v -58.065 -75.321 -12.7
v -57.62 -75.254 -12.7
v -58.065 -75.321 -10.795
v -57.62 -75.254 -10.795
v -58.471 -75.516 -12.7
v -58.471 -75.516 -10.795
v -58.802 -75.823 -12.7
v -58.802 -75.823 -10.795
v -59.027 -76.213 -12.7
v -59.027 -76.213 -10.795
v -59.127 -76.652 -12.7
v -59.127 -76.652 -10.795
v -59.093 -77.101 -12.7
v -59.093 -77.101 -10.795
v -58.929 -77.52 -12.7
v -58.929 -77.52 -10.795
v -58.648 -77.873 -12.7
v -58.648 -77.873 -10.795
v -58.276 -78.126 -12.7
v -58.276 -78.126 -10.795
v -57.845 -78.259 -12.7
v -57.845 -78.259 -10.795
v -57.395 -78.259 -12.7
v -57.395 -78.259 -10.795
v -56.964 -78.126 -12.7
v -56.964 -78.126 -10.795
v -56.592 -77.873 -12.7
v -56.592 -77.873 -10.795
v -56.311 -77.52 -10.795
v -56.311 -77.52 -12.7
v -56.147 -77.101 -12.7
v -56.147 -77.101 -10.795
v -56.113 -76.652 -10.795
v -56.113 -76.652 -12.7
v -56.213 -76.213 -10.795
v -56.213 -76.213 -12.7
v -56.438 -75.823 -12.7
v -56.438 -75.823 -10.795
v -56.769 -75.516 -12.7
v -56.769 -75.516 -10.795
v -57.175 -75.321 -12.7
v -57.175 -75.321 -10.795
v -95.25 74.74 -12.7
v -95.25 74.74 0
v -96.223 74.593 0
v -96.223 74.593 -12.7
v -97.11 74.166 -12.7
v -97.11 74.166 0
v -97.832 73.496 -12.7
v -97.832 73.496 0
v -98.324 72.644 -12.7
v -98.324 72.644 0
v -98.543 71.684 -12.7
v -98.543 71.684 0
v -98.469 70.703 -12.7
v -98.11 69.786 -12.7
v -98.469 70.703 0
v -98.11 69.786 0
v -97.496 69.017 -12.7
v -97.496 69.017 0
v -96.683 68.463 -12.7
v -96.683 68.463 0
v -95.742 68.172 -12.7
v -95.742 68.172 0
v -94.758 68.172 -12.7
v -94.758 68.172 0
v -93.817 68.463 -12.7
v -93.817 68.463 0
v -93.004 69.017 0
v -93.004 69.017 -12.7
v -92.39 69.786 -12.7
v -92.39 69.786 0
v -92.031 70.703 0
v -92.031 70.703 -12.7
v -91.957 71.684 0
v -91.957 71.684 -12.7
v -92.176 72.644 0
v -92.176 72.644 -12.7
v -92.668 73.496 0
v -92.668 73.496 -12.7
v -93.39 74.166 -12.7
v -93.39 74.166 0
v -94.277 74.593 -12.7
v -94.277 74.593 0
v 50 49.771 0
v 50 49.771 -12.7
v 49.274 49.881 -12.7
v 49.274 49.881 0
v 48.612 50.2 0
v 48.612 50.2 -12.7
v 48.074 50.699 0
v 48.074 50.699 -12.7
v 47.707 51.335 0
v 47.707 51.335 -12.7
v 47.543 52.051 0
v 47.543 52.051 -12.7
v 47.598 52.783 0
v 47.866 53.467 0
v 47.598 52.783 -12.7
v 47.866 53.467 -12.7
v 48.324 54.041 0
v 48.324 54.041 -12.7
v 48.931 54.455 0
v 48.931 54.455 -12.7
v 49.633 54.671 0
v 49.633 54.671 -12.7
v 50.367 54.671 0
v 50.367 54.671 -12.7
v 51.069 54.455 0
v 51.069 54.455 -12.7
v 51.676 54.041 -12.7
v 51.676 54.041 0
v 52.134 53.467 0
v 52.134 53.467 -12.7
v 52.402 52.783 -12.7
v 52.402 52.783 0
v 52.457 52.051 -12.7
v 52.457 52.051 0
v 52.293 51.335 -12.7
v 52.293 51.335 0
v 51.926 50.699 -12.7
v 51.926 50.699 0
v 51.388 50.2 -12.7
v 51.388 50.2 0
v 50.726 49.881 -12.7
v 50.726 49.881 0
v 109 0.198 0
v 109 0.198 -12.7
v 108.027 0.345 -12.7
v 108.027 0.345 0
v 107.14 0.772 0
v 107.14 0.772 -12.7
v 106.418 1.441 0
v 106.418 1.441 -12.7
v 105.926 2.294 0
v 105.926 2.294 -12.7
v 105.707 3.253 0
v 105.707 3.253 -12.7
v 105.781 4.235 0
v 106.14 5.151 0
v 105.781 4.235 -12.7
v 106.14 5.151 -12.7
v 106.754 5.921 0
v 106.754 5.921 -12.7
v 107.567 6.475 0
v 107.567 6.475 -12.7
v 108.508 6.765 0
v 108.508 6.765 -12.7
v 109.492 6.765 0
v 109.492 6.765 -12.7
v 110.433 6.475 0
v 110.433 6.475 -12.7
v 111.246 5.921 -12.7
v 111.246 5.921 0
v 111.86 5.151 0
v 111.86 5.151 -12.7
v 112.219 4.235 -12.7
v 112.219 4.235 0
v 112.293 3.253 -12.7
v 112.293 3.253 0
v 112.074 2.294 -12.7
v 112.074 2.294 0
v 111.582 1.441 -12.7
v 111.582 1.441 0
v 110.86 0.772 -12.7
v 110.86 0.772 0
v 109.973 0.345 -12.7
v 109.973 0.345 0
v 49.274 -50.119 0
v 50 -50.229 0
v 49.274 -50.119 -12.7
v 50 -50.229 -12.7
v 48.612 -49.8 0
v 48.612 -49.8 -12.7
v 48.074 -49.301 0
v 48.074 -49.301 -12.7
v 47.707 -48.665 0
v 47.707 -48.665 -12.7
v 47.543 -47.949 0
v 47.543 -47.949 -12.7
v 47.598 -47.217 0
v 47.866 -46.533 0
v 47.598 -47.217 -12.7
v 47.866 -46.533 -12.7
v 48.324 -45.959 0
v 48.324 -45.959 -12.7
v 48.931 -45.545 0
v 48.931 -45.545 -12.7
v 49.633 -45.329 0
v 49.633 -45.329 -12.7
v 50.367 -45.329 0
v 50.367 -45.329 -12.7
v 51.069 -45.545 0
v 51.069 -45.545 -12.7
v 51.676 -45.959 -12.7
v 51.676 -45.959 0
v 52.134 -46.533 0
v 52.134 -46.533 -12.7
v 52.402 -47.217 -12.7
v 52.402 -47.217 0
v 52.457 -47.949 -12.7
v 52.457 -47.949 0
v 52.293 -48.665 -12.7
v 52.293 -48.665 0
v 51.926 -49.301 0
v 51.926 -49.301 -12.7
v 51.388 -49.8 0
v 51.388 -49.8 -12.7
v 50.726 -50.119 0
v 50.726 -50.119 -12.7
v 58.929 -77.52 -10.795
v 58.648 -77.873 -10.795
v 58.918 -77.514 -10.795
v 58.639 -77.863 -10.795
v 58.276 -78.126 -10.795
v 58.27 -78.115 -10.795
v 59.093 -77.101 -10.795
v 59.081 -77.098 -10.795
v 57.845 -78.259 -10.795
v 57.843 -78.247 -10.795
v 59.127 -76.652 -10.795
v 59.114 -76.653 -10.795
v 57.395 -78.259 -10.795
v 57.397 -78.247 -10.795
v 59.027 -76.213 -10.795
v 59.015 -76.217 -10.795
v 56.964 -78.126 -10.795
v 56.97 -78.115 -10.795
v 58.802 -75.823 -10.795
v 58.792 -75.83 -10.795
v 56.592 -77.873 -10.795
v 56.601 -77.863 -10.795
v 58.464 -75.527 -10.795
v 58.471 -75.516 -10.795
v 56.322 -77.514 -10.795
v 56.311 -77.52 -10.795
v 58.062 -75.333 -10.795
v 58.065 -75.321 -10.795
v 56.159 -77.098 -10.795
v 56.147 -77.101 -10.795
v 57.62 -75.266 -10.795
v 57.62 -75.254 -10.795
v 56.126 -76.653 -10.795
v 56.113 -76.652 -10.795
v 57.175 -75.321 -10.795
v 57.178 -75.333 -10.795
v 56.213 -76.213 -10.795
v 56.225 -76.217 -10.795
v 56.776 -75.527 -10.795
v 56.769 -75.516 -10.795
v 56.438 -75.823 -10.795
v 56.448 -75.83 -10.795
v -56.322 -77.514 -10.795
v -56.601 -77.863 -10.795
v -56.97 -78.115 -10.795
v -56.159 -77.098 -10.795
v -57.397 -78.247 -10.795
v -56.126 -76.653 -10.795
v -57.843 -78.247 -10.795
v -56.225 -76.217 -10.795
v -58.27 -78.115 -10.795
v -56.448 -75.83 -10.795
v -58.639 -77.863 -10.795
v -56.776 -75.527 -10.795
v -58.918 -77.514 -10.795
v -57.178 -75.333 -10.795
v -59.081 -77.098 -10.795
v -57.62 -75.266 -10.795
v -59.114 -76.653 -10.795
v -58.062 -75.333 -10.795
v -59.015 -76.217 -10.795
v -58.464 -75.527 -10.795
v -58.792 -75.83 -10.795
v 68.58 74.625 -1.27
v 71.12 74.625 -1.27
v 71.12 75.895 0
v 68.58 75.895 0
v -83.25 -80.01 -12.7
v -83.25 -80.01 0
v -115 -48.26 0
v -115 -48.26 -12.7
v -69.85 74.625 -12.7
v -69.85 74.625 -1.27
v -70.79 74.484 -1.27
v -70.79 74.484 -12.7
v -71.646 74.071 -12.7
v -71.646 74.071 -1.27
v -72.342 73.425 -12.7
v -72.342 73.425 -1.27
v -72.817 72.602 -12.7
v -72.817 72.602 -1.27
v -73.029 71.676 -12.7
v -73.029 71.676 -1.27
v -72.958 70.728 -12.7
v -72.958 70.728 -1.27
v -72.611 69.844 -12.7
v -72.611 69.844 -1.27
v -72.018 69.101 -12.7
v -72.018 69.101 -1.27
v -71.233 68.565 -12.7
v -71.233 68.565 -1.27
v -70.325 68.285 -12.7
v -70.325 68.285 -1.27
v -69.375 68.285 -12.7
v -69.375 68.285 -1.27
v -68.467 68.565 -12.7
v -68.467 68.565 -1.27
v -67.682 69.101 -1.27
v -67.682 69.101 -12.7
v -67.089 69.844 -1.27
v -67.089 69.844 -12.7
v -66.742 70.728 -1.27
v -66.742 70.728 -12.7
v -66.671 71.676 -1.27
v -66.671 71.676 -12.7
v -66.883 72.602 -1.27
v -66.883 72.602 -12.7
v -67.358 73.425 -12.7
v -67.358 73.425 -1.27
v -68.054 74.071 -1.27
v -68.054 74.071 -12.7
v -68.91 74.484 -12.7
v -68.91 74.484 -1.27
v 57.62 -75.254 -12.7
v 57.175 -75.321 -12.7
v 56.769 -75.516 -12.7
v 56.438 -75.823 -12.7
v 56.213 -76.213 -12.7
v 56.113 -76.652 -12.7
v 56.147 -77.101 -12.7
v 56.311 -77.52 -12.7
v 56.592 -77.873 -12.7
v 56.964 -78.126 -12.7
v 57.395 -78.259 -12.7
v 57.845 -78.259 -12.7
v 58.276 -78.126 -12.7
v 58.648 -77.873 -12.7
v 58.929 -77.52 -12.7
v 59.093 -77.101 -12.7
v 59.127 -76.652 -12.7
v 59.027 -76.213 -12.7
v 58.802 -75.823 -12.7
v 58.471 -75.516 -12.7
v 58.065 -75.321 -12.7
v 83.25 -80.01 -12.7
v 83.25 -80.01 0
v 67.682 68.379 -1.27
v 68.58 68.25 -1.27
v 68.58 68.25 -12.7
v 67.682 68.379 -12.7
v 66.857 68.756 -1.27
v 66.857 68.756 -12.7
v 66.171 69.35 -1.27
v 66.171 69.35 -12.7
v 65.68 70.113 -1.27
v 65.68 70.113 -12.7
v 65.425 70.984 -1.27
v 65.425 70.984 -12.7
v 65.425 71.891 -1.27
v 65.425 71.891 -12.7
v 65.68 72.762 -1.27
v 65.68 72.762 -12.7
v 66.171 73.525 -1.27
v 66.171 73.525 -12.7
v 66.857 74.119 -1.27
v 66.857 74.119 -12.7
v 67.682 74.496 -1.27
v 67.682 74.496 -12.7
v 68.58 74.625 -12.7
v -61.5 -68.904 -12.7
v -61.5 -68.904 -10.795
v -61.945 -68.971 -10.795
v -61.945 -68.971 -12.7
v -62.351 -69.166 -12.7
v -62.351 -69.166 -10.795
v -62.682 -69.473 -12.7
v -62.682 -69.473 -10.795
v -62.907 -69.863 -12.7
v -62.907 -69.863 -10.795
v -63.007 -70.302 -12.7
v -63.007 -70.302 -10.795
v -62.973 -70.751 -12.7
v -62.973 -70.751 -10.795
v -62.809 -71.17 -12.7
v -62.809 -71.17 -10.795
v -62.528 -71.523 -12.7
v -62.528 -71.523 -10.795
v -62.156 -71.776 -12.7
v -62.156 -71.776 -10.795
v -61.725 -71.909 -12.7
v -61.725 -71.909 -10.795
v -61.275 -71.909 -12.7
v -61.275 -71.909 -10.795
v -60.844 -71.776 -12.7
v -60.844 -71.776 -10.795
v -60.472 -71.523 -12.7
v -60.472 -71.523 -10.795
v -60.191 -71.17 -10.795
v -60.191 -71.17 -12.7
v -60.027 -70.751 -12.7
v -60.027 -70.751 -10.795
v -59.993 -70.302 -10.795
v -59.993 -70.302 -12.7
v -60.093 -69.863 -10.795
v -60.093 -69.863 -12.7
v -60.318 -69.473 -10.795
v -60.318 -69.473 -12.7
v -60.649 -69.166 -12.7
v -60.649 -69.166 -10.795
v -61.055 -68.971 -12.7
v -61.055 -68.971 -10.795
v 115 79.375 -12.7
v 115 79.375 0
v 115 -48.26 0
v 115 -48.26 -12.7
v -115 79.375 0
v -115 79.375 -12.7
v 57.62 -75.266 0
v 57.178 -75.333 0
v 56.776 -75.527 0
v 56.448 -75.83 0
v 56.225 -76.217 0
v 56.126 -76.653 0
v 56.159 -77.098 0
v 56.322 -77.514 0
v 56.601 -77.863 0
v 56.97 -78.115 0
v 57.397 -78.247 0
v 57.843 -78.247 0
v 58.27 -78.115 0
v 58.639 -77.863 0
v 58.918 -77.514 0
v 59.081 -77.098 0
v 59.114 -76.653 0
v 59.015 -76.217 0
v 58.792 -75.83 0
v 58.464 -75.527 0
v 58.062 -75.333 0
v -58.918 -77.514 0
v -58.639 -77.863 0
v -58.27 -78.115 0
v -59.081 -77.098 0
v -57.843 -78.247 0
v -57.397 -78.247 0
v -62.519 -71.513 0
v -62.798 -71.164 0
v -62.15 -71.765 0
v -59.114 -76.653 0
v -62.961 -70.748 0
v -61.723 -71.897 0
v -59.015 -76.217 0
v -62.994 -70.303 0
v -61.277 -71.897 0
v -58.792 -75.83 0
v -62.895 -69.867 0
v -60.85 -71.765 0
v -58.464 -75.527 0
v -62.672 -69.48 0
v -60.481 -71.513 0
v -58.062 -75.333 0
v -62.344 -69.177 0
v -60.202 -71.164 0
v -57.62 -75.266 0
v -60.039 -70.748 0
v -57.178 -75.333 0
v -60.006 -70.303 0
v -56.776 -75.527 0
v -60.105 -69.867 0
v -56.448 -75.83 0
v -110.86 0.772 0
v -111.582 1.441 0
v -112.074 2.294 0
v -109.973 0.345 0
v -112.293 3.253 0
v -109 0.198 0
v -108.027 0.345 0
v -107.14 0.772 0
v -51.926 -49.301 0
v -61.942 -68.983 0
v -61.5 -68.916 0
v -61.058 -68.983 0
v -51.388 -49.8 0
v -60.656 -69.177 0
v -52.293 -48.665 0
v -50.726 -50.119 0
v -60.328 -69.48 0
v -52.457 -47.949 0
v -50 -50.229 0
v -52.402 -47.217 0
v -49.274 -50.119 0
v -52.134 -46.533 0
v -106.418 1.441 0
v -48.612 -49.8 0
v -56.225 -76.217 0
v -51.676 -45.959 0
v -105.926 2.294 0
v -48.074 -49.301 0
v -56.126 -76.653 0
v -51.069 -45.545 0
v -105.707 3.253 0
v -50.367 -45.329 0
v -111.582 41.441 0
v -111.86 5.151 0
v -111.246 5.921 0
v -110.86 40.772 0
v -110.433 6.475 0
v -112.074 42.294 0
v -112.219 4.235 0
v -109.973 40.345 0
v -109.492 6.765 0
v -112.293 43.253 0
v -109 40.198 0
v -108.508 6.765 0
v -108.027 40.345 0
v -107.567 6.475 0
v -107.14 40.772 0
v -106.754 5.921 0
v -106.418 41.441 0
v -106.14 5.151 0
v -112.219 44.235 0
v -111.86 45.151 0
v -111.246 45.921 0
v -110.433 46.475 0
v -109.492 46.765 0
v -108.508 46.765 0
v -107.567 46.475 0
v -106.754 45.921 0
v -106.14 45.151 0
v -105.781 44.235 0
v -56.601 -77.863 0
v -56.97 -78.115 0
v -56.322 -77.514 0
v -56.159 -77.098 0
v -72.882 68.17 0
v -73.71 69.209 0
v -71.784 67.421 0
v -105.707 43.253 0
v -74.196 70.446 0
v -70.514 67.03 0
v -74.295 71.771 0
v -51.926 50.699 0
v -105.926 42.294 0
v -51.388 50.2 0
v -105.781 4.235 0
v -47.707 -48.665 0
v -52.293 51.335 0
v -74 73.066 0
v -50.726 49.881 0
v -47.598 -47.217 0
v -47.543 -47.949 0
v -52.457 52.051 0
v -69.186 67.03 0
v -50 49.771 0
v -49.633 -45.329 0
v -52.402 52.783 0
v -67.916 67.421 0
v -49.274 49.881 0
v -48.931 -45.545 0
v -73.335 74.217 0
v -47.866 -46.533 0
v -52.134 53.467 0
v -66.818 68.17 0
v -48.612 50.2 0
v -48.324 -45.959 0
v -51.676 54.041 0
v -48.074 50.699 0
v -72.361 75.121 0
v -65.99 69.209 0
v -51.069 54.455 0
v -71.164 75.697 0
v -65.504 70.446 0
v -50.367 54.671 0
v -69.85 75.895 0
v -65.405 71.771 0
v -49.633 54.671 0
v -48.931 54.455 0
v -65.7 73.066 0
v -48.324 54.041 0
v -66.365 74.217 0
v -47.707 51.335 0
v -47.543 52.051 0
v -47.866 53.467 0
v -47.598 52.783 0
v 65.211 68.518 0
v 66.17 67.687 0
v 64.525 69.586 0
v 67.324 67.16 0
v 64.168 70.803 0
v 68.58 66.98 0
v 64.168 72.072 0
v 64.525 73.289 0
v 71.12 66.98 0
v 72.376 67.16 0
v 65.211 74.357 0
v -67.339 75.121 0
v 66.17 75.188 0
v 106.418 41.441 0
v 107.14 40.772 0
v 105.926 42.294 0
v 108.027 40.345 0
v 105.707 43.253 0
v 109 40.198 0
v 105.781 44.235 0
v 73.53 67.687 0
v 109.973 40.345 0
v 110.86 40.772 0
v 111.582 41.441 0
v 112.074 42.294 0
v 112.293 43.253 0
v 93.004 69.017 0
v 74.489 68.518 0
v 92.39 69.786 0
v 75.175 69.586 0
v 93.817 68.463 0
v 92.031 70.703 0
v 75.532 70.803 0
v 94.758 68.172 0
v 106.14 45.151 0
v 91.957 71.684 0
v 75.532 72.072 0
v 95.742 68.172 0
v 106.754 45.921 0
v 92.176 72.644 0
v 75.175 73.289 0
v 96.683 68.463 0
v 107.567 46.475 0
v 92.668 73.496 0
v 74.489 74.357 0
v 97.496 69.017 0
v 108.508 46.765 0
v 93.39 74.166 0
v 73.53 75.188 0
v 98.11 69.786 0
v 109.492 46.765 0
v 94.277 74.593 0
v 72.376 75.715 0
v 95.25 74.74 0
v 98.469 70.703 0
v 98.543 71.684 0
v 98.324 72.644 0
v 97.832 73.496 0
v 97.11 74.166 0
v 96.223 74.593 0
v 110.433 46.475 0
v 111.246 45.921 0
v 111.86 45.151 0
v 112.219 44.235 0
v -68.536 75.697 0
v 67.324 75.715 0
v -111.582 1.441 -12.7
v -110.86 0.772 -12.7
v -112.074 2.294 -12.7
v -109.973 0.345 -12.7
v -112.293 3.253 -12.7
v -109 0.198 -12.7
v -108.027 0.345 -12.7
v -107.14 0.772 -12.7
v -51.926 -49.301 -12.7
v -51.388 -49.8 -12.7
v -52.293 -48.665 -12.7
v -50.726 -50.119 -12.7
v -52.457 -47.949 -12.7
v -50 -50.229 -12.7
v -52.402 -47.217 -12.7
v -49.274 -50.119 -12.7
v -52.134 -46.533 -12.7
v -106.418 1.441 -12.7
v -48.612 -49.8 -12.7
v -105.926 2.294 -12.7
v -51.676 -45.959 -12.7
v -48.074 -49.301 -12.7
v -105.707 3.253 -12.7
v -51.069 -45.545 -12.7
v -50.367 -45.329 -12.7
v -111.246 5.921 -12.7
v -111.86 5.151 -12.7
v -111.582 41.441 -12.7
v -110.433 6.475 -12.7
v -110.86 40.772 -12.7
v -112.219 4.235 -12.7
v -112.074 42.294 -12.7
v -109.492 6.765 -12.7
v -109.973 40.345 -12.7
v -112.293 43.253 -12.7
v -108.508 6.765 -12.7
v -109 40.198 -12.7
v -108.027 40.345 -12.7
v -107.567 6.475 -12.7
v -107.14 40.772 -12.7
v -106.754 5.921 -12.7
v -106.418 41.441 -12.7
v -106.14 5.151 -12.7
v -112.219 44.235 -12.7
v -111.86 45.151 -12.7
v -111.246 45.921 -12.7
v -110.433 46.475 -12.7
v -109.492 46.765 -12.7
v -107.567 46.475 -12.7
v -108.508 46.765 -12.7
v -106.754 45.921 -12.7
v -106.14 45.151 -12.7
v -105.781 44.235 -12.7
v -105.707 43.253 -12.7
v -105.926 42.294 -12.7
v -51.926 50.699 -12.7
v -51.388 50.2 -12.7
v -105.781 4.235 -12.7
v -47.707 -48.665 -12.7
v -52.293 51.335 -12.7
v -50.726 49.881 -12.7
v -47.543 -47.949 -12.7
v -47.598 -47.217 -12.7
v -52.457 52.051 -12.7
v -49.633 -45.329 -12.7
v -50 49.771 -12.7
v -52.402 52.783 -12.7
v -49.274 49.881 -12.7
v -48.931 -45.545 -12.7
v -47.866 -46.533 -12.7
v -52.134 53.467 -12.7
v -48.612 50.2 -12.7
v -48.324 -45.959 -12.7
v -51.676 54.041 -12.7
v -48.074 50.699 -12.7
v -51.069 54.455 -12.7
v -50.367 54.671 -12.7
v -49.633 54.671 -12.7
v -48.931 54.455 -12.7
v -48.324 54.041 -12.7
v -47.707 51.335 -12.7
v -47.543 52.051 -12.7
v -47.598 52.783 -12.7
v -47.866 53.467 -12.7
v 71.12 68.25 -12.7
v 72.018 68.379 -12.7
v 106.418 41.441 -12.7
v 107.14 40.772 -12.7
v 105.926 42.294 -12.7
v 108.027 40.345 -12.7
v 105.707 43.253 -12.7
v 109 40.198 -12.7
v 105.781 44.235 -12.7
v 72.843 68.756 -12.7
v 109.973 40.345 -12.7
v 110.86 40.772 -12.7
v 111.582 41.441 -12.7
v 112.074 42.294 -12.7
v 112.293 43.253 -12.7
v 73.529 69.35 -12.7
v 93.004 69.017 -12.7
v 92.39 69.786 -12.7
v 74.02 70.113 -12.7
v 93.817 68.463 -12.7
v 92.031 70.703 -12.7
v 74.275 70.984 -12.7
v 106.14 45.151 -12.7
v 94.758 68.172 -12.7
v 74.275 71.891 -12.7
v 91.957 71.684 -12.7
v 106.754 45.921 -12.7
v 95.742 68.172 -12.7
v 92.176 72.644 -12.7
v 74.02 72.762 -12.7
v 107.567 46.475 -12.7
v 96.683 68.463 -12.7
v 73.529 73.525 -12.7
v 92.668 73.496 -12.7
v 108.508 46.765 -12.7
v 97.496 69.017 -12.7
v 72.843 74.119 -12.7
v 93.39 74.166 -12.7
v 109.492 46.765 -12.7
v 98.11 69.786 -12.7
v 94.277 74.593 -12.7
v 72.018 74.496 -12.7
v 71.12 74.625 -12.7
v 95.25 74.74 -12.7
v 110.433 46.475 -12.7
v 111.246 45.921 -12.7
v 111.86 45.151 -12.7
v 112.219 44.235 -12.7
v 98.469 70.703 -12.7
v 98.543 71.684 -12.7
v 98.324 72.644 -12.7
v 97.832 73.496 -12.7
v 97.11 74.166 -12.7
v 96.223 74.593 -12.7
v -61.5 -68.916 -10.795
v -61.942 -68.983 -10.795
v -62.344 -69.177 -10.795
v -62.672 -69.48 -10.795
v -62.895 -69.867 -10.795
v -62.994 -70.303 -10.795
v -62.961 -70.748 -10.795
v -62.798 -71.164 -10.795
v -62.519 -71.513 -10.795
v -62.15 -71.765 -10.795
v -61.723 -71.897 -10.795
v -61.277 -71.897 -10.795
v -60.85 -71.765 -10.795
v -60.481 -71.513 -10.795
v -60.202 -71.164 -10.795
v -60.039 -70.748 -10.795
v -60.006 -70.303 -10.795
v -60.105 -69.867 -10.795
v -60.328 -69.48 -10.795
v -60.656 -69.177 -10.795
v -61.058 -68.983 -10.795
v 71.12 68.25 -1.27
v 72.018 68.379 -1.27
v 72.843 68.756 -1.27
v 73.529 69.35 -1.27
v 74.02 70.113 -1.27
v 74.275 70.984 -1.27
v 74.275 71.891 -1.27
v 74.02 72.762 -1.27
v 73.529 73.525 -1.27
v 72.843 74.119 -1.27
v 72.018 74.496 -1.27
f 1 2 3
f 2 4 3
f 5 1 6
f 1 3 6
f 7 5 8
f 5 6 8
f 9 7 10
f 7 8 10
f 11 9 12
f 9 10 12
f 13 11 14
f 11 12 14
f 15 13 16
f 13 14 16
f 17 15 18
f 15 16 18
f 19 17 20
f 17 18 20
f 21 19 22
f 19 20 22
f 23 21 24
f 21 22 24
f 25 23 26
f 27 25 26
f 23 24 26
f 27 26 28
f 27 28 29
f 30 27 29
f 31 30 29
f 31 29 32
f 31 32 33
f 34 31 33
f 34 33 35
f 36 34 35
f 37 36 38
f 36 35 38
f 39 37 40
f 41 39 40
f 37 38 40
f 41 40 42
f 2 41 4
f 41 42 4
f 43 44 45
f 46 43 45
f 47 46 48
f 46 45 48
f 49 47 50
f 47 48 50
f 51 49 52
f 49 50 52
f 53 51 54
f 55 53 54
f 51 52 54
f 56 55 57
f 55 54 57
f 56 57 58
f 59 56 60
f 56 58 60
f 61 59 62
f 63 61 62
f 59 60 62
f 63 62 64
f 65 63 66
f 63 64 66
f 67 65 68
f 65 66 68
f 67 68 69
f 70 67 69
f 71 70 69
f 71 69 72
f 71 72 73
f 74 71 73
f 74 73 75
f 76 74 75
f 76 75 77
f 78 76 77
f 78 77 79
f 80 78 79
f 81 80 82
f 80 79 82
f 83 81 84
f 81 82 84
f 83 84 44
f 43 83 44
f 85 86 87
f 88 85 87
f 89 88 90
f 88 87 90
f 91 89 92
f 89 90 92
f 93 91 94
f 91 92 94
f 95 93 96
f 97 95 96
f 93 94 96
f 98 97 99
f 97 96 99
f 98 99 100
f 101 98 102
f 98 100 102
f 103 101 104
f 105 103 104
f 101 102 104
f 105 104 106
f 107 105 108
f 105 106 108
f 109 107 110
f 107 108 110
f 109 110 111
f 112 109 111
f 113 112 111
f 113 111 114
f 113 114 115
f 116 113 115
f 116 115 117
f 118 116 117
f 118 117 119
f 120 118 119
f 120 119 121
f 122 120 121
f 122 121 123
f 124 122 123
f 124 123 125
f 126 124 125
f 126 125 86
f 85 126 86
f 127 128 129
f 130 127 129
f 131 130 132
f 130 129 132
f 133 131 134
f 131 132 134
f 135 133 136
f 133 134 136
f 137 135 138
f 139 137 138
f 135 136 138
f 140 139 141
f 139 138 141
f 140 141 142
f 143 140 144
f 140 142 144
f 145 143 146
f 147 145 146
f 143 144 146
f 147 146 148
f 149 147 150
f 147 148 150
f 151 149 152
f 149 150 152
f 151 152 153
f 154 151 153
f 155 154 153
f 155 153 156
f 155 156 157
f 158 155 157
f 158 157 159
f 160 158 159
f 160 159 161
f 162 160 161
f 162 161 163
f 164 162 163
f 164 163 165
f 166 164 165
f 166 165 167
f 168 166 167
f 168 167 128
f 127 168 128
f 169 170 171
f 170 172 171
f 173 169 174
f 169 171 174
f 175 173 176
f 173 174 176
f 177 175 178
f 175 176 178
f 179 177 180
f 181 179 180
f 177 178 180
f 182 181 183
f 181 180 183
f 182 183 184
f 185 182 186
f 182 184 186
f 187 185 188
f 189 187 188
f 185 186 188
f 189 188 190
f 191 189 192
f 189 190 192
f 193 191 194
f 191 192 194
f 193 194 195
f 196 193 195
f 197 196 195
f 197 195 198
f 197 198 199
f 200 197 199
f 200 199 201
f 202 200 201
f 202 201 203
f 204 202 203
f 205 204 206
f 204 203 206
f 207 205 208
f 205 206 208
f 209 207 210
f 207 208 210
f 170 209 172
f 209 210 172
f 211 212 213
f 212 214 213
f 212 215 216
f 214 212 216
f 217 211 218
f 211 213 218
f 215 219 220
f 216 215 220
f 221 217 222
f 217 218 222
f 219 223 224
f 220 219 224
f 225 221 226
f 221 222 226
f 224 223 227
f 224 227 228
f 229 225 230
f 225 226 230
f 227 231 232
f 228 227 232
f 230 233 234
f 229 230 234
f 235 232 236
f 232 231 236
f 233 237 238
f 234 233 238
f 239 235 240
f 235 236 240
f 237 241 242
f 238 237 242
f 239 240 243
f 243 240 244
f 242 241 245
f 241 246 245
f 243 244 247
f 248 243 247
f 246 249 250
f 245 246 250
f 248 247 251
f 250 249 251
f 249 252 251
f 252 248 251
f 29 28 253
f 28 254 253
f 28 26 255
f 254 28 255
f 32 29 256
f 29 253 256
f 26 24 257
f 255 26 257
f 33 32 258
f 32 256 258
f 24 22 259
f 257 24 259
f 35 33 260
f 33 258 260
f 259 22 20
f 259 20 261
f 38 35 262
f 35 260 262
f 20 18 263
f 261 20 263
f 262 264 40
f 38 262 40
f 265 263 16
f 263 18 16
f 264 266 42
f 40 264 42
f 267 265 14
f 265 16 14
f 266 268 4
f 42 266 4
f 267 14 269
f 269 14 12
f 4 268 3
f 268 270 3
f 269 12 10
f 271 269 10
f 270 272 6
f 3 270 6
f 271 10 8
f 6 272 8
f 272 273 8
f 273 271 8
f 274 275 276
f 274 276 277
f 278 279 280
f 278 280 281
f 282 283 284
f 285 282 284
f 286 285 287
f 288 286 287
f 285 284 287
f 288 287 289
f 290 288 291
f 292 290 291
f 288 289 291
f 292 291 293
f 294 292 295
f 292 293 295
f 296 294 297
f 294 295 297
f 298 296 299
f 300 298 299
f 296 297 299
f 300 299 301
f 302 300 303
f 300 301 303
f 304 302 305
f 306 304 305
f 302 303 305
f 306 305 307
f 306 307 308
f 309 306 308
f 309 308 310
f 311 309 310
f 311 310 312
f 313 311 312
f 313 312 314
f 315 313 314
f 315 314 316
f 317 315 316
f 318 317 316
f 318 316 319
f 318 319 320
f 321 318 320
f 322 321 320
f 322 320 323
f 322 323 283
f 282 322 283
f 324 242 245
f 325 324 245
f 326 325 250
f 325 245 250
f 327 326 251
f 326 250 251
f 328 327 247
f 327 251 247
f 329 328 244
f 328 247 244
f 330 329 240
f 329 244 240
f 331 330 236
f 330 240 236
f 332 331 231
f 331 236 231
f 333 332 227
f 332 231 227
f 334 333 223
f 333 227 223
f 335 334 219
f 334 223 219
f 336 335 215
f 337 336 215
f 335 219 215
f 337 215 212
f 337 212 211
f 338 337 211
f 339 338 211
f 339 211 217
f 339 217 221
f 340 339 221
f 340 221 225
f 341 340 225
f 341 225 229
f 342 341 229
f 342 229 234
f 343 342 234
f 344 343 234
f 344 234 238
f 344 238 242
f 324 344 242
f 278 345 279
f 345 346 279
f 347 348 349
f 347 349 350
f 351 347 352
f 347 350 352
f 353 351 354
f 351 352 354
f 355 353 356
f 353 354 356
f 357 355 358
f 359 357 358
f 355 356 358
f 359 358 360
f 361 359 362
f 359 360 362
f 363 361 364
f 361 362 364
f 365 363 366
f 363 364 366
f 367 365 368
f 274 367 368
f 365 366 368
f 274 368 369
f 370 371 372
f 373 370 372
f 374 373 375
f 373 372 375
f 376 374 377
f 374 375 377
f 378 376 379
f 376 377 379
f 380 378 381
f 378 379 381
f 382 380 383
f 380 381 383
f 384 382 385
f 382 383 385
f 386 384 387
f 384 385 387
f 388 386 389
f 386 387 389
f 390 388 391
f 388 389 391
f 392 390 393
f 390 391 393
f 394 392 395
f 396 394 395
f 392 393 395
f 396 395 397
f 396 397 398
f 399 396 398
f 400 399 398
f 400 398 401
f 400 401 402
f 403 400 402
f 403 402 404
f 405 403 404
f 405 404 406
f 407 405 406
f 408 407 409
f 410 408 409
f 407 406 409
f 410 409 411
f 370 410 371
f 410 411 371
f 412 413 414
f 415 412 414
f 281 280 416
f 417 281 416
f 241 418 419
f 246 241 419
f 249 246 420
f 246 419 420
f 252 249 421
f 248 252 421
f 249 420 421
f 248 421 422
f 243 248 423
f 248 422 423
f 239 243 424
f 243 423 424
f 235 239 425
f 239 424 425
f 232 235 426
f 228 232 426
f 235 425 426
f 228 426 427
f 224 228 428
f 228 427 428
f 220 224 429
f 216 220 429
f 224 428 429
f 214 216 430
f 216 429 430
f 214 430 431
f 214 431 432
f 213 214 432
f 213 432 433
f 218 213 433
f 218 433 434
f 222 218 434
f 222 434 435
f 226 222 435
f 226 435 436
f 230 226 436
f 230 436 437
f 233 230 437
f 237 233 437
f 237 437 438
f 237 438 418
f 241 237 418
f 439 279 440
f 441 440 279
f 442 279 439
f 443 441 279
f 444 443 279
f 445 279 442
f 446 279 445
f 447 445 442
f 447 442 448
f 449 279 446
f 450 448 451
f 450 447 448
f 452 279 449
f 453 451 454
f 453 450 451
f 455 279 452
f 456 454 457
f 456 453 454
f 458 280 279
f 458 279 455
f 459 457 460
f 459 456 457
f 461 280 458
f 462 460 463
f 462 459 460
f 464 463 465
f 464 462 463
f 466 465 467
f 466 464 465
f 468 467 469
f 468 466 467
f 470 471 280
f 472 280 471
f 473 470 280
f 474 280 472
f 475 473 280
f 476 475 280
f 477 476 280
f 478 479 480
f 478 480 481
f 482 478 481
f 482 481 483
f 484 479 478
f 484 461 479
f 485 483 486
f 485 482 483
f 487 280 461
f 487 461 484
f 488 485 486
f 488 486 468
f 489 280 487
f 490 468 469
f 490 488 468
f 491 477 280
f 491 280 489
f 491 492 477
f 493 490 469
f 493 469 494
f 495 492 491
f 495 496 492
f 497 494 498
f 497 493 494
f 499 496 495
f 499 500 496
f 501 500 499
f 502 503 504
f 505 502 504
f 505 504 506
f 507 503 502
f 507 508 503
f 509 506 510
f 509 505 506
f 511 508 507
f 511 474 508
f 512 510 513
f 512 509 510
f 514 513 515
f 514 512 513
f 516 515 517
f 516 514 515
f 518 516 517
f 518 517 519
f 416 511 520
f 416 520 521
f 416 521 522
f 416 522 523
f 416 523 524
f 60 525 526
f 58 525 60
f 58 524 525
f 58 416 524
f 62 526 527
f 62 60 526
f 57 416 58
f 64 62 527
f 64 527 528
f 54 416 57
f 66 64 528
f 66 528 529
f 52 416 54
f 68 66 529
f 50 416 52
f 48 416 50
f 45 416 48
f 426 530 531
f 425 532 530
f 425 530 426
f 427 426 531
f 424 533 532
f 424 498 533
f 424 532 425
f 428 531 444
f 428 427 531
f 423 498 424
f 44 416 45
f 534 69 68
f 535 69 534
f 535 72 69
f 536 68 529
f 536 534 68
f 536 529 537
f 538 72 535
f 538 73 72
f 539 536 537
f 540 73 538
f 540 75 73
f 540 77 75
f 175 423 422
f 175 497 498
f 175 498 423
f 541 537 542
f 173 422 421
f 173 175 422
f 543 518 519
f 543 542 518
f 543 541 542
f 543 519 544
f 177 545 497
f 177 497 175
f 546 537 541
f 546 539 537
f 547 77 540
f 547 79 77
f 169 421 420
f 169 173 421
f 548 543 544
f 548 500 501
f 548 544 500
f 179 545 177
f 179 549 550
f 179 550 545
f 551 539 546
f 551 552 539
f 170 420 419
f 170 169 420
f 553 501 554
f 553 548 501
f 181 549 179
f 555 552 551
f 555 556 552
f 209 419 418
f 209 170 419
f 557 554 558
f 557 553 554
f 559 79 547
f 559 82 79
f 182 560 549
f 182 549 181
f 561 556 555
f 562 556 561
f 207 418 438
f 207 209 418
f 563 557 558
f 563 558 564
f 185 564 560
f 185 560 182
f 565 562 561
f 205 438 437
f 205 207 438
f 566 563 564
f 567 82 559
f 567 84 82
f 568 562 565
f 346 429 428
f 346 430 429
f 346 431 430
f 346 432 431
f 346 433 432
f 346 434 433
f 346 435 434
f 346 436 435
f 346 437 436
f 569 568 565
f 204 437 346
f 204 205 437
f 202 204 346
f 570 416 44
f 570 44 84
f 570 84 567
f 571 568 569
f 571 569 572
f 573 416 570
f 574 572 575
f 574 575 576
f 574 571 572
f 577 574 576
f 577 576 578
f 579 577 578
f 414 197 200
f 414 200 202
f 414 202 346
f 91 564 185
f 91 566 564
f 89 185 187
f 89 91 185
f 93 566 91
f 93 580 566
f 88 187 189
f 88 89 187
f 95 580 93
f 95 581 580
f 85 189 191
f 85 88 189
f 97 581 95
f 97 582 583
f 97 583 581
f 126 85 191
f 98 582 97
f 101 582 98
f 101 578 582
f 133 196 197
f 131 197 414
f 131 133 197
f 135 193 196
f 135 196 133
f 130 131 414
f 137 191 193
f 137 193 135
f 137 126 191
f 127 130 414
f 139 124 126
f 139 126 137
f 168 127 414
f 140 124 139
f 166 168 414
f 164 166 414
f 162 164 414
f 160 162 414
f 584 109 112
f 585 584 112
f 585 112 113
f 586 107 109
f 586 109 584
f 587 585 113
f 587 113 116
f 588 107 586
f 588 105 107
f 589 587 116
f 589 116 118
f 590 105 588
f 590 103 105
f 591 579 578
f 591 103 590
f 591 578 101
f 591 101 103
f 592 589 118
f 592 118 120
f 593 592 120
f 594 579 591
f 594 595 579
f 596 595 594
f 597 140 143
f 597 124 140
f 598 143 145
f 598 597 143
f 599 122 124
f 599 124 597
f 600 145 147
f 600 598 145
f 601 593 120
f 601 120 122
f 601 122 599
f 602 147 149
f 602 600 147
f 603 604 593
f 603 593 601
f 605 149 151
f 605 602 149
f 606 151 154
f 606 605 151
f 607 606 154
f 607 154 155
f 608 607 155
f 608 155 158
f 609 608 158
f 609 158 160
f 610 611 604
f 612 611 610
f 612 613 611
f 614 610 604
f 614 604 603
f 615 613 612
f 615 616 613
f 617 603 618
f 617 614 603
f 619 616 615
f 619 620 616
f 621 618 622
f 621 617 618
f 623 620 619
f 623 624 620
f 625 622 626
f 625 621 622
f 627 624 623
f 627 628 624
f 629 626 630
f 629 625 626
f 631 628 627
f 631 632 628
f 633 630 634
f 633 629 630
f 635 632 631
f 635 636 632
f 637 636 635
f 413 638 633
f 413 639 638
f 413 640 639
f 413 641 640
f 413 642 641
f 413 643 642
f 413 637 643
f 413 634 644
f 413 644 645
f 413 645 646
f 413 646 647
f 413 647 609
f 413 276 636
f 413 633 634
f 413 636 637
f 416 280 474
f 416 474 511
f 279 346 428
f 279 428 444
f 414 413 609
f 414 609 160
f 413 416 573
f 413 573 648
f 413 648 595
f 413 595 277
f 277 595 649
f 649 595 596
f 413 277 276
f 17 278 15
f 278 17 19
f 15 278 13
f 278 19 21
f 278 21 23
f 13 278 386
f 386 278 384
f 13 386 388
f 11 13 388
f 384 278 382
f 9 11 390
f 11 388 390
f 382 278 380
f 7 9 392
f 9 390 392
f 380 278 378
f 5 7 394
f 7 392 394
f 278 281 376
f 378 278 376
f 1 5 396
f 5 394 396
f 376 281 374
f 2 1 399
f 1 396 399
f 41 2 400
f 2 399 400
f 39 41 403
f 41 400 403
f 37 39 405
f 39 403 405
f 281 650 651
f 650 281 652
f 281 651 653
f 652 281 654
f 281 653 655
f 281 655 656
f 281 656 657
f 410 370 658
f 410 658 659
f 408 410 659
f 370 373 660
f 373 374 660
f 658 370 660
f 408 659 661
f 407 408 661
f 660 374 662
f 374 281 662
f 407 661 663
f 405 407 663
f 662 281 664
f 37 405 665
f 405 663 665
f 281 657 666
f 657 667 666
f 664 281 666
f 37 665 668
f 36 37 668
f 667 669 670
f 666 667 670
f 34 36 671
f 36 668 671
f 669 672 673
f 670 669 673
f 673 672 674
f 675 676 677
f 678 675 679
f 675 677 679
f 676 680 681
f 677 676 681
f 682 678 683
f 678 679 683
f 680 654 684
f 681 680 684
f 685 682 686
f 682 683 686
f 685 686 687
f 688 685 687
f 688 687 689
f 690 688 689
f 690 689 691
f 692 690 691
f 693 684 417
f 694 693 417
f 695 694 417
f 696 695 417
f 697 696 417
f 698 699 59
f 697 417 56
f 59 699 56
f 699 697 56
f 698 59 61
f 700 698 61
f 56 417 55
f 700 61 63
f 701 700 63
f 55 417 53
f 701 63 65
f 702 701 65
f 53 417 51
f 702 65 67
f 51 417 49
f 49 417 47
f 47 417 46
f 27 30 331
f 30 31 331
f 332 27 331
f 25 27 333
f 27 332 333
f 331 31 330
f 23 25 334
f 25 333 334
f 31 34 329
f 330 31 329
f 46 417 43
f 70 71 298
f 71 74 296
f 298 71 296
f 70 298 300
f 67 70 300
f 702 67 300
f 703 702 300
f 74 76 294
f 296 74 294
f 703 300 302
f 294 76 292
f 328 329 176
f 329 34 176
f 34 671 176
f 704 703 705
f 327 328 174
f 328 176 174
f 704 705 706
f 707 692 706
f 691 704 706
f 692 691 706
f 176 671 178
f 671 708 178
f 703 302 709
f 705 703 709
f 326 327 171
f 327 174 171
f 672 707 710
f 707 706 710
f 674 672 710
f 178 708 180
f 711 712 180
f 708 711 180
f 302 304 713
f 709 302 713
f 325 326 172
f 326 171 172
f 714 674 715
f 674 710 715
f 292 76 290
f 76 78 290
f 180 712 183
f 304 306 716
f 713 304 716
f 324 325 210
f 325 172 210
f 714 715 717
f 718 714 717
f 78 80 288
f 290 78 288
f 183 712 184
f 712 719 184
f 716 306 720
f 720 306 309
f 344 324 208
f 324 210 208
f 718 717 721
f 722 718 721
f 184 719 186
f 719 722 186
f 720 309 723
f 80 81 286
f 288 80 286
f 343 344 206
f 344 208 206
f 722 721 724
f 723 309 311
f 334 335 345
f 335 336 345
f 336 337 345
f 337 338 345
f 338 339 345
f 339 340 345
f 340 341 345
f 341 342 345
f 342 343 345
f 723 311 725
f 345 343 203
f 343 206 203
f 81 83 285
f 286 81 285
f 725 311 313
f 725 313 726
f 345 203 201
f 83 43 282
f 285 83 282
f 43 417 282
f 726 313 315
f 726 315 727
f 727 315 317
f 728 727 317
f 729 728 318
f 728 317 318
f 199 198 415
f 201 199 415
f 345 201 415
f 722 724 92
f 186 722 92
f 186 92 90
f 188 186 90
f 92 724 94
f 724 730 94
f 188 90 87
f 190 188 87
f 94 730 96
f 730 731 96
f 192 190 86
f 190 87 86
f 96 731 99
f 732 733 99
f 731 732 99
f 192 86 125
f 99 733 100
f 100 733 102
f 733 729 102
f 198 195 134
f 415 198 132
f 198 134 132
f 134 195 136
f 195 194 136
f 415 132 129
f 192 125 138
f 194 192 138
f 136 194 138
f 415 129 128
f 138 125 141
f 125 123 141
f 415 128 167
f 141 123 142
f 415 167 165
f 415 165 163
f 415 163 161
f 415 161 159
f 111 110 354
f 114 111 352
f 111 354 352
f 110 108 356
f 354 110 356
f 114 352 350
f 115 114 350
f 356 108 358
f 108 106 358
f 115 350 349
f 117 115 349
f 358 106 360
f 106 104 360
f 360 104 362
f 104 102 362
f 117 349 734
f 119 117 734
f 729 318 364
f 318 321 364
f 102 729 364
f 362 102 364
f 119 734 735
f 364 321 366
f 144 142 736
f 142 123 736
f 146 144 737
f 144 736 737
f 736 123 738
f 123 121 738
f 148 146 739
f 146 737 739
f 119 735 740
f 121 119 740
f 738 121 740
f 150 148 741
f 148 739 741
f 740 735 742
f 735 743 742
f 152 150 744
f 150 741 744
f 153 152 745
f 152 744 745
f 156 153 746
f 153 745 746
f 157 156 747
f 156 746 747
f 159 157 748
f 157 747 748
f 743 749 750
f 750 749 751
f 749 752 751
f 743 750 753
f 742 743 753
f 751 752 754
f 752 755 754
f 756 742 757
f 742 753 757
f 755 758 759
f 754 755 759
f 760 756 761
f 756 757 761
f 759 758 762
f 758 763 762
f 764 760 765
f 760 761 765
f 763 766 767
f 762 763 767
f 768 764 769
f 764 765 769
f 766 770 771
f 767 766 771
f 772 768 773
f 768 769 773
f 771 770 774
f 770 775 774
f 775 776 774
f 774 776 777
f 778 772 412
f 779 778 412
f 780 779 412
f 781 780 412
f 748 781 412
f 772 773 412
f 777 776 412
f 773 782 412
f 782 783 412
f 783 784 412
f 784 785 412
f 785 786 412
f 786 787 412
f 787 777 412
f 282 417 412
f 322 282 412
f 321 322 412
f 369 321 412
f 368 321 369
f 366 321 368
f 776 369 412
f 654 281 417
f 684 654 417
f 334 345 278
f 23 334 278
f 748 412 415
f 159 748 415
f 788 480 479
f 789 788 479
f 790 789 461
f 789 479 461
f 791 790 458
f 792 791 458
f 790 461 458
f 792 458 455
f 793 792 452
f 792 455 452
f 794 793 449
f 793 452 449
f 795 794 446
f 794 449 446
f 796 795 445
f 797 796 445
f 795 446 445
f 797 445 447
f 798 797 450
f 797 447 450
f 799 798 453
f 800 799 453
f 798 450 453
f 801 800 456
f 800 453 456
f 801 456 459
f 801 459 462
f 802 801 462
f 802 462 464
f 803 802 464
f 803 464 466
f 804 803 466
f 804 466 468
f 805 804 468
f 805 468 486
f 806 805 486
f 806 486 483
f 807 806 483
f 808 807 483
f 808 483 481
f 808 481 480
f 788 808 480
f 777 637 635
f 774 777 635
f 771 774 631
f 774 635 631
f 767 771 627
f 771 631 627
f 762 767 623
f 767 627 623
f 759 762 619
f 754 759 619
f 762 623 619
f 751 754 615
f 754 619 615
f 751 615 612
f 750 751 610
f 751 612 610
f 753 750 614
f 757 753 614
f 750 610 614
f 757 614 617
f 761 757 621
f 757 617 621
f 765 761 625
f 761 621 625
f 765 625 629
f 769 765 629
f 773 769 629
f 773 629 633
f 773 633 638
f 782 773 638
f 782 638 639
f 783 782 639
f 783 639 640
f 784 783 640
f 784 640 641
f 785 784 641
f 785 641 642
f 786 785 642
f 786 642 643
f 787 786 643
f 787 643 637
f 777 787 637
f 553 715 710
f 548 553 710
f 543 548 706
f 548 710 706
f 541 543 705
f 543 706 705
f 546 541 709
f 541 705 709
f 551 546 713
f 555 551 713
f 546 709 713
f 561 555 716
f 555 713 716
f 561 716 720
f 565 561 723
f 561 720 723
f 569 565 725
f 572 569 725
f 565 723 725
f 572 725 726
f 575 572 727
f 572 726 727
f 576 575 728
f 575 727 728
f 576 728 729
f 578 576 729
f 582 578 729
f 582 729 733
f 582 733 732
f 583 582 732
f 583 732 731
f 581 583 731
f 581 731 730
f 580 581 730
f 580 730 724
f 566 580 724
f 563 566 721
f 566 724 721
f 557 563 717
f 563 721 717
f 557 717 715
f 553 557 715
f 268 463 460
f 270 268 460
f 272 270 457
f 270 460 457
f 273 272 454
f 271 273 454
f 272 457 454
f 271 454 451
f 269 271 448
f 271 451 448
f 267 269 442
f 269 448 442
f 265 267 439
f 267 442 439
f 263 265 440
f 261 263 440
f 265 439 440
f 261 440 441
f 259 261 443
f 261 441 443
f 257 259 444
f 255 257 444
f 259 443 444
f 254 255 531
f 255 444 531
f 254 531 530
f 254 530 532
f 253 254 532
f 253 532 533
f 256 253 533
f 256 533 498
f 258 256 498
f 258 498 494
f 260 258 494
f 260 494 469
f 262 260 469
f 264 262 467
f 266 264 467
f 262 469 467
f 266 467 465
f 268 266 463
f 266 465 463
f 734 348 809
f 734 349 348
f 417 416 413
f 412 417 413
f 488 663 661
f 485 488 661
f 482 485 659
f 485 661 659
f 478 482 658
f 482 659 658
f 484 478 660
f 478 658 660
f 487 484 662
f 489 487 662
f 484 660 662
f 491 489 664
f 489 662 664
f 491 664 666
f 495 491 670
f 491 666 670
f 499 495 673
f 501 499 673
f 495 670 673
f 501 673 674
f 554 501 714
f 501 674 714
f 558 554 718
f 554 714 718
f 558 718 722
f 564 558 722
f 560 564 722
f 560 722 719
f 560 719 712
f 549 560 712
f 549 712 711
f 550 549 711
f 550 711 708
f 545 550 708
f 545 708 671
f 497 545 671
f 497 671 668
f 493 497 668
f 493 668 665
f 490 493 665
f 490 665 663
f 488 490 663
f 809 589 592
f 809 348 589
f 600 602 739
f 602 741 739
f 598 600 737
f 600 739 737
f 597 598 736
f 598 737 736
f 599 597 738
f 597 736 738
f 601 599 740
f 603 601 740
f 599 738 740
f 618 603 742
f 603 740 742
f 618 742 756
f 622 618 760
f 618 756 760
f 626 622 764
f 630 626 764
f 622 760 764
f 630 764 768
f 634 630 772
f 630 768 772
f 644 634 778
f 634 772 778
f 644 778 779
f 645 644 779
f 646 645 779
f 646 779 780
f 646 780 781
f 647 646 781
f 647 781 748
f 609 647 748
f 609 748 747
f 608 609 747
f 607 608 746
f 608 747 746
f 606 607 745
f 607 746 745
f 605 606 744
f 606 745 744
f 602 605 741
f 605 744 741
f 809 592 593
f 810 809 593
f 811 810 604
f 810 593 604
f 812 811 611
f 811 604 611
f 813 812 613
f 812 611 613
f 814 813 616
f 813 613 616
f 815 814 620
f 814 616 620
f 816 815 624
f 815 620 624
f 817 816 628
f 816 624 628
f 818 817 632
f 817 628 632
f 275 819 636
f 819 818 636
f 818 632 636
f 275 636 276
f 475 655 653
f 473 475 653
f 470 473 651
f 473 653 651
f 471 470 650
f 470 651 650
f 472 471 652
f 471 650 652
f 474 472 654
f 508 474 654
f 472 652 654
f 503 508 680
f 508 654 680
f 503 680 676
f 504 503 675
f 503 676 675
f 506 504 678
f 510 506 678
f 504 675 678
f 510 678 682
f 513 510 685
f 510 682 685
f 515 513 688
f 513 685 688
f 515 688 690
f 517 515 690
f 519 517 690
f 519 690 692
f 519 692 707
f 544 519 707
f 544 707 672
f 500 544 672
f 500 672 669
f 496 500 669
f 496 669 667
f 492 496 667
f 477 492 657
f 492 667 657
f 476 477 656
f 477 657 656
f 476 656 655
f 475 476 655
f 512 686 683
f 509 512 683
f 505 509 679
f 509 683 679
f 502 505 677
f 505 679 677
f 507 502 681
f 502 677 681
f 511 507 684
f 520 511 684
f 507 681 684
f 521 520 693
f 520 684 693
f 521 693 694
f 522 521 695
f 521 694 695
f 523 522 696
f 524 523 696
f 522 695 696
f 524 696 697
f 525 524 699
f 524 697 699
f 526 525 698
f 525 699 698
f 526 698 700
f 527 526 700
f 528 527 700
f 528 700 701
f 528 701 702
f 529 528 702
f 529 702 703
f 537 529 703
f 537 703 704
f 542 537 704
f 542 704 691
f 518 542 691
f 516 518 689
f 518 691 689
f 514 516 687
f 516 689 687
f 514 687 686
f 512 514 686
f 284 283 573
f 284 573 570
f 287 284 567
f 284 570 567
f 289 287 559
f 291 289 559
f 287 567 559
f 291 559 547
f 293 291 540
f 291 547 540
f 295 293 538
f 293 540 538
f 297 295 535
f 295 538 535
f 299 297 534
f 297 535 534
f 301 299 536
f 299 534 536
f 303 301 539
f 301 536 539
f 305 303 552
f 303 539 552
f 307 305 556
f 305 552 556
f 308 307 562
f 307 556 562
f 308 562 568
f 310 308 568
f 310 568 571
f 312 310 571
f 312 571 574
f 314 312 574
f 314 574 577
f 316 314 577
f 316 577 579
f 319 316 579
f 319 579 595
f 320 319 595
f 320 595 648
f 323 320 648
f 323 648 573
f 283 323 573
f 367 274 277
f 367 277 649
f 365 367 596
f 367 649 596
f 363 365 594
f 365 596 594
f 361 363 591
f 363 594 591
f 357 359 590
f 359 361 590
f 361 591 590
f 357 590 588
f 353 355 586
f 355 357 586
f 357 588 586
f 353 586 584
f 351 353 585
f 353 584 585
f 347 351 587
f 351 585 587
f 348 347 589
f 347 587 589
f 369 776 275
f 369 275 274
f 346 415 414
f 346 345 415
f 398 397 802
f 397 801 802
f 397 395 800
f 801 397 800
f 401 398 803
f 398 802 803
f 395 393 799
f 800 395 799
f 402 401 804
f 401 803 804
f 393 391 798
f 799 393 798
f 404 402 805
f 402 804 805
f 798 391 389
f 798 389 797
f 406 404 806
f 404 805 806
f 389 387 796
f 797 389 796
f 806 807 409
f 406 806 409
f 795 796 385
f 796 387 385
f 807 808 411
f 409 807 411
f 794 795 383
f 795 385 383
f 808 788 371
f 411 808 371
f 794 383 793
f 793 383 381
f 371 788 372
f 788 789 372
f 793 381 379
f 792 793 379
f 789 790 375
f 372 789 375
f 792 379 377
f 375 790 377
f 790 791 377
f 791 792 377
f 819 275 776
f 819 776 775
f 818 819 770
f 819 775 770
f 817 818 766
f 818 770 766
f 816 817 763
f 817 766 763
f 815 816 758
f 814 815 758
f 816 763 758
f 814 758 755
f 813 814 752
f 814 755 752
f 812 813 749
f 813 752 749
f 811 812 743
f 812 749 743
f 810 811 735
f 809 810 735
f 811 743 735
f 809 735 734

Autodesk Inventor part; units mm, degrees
ref_plane "YZ Plane" through (0, 0, 0) normal (1, 0, 0) x (0, 1, 0)
ref_plane "XZ Plane" through (0, 0, 0) normal (0, 1, 0) x (-1, 0, 0)
ref_plane "XY Plane" through (0, 0, 0) normal (0, 0, 1) x (1, 0, 0)
sketch "Sketch1" plane through (0, 0, 0) normal (0, 0, 1) x (1, 0, 0)
  line L0 (0, 111.252) -> (0, -111.887) projected
  line L1 (-161, 0) -> (161, 0) projected
  line L2 (115, -80.01) -> (-115, -80.01)
  line L3 (-115, -80.01) -> (-115, 79.375)
  line L4 (-115, 79.375) -> (115, 79.375)
  line L5 (115, 79.375) -> (115, -80.01)
  line L6 (50, -47.7648) -> (-50, -47.7648) construction
  line L7 (-50, -47.7648) -> (-50, 52.2352) construction
  line L8 (-50, 52.2352) -> (50, 52.2352) construction
  line L9 (50, 52.2352) -> (50, -47.7648) construction
  line L10 (50, -47.7648) -> (-50, 52.2352) construction
  line L11 (-50, -47.7648) -> (50, 52.2352) construction
  line L12 (109, 3.5) -> (-109, 3.5) construction
  line L13 (-109, 3.5) -> (-109, 43.5) construction
  line L14 (-109, 43.5) -> (109, 43.5) construction
  line L15 (109, 43.5) -> (109, 3.5) construction
  line L16 (109, 3.5) -> (-109, 43.5) construction
  line L17 (-109, 3.5) -> (109, 43.5) construction
  point P0 (0, 2.2352)
  point P1 (0, 23.5)
  point P2 (-57.62, -76.7648)
  point P3 (57.62, -76.7648)
  dimension "d0" = 230
  dimension "d1" = 159.385
  dimension "d4" = 100
  dimension "d5" = 100
  dimension "d28" = 35.875
  dimension "d29" = 40
  dimension "d30" = 6
  dimension "d38" = 29
  dimension "d39" = 79.375
  dimension "d40" = 115
  dimension "d48" = 2.2352
  dimension "d52" = 7.62
  dimension "d53" = 7.62
extrude "Extrusion1" add sketch "Sketch1" against normal blind 12.7
hole "Hole1" at (-50, 52.2352, 0) at (50, 52.2352, 0) at (50, -47.7648, 0) at (-50, -47.7648, 0) direction (0, 0, -1) diameter 4.9276 end through all
hole "Hole3" at (-109, 43.5, 0) at (-109, 3.5, 0) at (109, 3.5, 0) at (109, 43.5, 0) direction (0, 0, -1) diameter 6.604 end through all clearance for "Socket Head Cap Screw" size "M6" standard "Ansi Metric M Profile"
chamfer "Chamfer1" distance 31.75 angle 45 2 edges at (-115, -80.01, -6.35) (115, -80.01, -6.35)
sketch "Sketch3" plane through (0, 0, -12.7) normal (0, 0, 1) x (1, 0, 0)
  line L0 (-95.25, 71.4375) -> (95.25, 71.4375) construction
  line L1 (0, 111.252) -> (0, -111.887) construction
  line L2 (-161, 0) -> (161, 0) construction
  line L3 (71.12, 71.4375) -> (68.58, 71.4375) construction
  line L4 (71.12, 74.6252) -> (68.58, 74.6252)
  line L5 (68.58, 68.2498) -> (71.12, 68.2498)
  arc A0 (71.12, 68.2498) -> (71.12, 74.6252) centre (71.12, 71.4375) ccw
  arc A1 (68.58, 74.6252) -> (68.58, 68.2498) centre (68.58, 71.4375) ccw
  line L6 (-115, 79.375) -> (115, 79.375) projected
  point P0 (0, 0)
  point P1 (-69.85, 71.4375)
  point P2 (69.85, 71.4375)
  dimension "d54" = 95.25
  dimension "d55" = 69.85
  dimension "d56" = 69.85
  dimension "d57" = 95.25
  dimension "d58" = 2.54
  dimension "d59" = 6.3754
  dimension "d69" = 7.9375
extrude "Extrusion3" cut sketch "Sketch3" along normal up to next
hole "Hole7" at (-69.85, 71.4375, -12.7) direction (0, 0, 1) diameter 6.3754 end through all
hole "Hole8" at (95.25, 71.4375, -12.7) at (-95.25, 71.4375, -12.7) direction (0, 0, 1) diameter 6.604 end through all clearance for "Socket Head Cap Screw" size "M6" standard "Ansi Metric M Profile"
chamfer "Chamfer3" distance 1.27 angle 45 5 edges at (-69.85, 68.2498, 0) (65.3923, 71.4375, 0) (69.85, 74.6252, 0) (74.3077, 71.4375, 0) (69.85, 68.2498, 0)
sketch "Sketch4" plane through (0, 0, -12.7) normal (0, 0, -1) x (-1, 0, 0)
  line L0 (0, -111.887) -> (0, 111.252) projected
  line L1 (-161, 0) -> (161, 0) projected
  line L2 (60, -77.854) -> (-60, -77.854) construction
  line L3 (-60, -77.854) -> (-60, 77.854) construction
  line L4 (-60, 77.854) -> (60, 77.854) construction
  line L5 (60, 77.854) -> (60, -77.854) construction
  line L6 (60, -77.854) -> (-60, 77.854) construction
  line L7 (-60, -77.854) -> (60, 77.854) construction
  circle A0 centre (61.5, -70.4148) radius 1.5 construction
  point P0 (0, 0)
  point P1 (-57.62, -76.7648)
  point P2 (57.62, -76.7648)
  dimension "d106" = 120
  dimension "d107" = 3
  dimension "d108" = 6.35
hole "Hole9" at (57.62, -76.7648, -12.7) at (-57.62, -76.7648, -12.7) at (-61.5, -70.4148, -12.7) direction (0, 0, 1) diameter 2.9972 end through all counterbore diameter 3.0226 counterbore depth 1.905
equation "\"d40\" = 0.5 * d0"
equation "\"d56\" = d55"
equation "\"d57\" = d54"
properties part number "J008086" material "ALUMINUM, 6061-T651"
